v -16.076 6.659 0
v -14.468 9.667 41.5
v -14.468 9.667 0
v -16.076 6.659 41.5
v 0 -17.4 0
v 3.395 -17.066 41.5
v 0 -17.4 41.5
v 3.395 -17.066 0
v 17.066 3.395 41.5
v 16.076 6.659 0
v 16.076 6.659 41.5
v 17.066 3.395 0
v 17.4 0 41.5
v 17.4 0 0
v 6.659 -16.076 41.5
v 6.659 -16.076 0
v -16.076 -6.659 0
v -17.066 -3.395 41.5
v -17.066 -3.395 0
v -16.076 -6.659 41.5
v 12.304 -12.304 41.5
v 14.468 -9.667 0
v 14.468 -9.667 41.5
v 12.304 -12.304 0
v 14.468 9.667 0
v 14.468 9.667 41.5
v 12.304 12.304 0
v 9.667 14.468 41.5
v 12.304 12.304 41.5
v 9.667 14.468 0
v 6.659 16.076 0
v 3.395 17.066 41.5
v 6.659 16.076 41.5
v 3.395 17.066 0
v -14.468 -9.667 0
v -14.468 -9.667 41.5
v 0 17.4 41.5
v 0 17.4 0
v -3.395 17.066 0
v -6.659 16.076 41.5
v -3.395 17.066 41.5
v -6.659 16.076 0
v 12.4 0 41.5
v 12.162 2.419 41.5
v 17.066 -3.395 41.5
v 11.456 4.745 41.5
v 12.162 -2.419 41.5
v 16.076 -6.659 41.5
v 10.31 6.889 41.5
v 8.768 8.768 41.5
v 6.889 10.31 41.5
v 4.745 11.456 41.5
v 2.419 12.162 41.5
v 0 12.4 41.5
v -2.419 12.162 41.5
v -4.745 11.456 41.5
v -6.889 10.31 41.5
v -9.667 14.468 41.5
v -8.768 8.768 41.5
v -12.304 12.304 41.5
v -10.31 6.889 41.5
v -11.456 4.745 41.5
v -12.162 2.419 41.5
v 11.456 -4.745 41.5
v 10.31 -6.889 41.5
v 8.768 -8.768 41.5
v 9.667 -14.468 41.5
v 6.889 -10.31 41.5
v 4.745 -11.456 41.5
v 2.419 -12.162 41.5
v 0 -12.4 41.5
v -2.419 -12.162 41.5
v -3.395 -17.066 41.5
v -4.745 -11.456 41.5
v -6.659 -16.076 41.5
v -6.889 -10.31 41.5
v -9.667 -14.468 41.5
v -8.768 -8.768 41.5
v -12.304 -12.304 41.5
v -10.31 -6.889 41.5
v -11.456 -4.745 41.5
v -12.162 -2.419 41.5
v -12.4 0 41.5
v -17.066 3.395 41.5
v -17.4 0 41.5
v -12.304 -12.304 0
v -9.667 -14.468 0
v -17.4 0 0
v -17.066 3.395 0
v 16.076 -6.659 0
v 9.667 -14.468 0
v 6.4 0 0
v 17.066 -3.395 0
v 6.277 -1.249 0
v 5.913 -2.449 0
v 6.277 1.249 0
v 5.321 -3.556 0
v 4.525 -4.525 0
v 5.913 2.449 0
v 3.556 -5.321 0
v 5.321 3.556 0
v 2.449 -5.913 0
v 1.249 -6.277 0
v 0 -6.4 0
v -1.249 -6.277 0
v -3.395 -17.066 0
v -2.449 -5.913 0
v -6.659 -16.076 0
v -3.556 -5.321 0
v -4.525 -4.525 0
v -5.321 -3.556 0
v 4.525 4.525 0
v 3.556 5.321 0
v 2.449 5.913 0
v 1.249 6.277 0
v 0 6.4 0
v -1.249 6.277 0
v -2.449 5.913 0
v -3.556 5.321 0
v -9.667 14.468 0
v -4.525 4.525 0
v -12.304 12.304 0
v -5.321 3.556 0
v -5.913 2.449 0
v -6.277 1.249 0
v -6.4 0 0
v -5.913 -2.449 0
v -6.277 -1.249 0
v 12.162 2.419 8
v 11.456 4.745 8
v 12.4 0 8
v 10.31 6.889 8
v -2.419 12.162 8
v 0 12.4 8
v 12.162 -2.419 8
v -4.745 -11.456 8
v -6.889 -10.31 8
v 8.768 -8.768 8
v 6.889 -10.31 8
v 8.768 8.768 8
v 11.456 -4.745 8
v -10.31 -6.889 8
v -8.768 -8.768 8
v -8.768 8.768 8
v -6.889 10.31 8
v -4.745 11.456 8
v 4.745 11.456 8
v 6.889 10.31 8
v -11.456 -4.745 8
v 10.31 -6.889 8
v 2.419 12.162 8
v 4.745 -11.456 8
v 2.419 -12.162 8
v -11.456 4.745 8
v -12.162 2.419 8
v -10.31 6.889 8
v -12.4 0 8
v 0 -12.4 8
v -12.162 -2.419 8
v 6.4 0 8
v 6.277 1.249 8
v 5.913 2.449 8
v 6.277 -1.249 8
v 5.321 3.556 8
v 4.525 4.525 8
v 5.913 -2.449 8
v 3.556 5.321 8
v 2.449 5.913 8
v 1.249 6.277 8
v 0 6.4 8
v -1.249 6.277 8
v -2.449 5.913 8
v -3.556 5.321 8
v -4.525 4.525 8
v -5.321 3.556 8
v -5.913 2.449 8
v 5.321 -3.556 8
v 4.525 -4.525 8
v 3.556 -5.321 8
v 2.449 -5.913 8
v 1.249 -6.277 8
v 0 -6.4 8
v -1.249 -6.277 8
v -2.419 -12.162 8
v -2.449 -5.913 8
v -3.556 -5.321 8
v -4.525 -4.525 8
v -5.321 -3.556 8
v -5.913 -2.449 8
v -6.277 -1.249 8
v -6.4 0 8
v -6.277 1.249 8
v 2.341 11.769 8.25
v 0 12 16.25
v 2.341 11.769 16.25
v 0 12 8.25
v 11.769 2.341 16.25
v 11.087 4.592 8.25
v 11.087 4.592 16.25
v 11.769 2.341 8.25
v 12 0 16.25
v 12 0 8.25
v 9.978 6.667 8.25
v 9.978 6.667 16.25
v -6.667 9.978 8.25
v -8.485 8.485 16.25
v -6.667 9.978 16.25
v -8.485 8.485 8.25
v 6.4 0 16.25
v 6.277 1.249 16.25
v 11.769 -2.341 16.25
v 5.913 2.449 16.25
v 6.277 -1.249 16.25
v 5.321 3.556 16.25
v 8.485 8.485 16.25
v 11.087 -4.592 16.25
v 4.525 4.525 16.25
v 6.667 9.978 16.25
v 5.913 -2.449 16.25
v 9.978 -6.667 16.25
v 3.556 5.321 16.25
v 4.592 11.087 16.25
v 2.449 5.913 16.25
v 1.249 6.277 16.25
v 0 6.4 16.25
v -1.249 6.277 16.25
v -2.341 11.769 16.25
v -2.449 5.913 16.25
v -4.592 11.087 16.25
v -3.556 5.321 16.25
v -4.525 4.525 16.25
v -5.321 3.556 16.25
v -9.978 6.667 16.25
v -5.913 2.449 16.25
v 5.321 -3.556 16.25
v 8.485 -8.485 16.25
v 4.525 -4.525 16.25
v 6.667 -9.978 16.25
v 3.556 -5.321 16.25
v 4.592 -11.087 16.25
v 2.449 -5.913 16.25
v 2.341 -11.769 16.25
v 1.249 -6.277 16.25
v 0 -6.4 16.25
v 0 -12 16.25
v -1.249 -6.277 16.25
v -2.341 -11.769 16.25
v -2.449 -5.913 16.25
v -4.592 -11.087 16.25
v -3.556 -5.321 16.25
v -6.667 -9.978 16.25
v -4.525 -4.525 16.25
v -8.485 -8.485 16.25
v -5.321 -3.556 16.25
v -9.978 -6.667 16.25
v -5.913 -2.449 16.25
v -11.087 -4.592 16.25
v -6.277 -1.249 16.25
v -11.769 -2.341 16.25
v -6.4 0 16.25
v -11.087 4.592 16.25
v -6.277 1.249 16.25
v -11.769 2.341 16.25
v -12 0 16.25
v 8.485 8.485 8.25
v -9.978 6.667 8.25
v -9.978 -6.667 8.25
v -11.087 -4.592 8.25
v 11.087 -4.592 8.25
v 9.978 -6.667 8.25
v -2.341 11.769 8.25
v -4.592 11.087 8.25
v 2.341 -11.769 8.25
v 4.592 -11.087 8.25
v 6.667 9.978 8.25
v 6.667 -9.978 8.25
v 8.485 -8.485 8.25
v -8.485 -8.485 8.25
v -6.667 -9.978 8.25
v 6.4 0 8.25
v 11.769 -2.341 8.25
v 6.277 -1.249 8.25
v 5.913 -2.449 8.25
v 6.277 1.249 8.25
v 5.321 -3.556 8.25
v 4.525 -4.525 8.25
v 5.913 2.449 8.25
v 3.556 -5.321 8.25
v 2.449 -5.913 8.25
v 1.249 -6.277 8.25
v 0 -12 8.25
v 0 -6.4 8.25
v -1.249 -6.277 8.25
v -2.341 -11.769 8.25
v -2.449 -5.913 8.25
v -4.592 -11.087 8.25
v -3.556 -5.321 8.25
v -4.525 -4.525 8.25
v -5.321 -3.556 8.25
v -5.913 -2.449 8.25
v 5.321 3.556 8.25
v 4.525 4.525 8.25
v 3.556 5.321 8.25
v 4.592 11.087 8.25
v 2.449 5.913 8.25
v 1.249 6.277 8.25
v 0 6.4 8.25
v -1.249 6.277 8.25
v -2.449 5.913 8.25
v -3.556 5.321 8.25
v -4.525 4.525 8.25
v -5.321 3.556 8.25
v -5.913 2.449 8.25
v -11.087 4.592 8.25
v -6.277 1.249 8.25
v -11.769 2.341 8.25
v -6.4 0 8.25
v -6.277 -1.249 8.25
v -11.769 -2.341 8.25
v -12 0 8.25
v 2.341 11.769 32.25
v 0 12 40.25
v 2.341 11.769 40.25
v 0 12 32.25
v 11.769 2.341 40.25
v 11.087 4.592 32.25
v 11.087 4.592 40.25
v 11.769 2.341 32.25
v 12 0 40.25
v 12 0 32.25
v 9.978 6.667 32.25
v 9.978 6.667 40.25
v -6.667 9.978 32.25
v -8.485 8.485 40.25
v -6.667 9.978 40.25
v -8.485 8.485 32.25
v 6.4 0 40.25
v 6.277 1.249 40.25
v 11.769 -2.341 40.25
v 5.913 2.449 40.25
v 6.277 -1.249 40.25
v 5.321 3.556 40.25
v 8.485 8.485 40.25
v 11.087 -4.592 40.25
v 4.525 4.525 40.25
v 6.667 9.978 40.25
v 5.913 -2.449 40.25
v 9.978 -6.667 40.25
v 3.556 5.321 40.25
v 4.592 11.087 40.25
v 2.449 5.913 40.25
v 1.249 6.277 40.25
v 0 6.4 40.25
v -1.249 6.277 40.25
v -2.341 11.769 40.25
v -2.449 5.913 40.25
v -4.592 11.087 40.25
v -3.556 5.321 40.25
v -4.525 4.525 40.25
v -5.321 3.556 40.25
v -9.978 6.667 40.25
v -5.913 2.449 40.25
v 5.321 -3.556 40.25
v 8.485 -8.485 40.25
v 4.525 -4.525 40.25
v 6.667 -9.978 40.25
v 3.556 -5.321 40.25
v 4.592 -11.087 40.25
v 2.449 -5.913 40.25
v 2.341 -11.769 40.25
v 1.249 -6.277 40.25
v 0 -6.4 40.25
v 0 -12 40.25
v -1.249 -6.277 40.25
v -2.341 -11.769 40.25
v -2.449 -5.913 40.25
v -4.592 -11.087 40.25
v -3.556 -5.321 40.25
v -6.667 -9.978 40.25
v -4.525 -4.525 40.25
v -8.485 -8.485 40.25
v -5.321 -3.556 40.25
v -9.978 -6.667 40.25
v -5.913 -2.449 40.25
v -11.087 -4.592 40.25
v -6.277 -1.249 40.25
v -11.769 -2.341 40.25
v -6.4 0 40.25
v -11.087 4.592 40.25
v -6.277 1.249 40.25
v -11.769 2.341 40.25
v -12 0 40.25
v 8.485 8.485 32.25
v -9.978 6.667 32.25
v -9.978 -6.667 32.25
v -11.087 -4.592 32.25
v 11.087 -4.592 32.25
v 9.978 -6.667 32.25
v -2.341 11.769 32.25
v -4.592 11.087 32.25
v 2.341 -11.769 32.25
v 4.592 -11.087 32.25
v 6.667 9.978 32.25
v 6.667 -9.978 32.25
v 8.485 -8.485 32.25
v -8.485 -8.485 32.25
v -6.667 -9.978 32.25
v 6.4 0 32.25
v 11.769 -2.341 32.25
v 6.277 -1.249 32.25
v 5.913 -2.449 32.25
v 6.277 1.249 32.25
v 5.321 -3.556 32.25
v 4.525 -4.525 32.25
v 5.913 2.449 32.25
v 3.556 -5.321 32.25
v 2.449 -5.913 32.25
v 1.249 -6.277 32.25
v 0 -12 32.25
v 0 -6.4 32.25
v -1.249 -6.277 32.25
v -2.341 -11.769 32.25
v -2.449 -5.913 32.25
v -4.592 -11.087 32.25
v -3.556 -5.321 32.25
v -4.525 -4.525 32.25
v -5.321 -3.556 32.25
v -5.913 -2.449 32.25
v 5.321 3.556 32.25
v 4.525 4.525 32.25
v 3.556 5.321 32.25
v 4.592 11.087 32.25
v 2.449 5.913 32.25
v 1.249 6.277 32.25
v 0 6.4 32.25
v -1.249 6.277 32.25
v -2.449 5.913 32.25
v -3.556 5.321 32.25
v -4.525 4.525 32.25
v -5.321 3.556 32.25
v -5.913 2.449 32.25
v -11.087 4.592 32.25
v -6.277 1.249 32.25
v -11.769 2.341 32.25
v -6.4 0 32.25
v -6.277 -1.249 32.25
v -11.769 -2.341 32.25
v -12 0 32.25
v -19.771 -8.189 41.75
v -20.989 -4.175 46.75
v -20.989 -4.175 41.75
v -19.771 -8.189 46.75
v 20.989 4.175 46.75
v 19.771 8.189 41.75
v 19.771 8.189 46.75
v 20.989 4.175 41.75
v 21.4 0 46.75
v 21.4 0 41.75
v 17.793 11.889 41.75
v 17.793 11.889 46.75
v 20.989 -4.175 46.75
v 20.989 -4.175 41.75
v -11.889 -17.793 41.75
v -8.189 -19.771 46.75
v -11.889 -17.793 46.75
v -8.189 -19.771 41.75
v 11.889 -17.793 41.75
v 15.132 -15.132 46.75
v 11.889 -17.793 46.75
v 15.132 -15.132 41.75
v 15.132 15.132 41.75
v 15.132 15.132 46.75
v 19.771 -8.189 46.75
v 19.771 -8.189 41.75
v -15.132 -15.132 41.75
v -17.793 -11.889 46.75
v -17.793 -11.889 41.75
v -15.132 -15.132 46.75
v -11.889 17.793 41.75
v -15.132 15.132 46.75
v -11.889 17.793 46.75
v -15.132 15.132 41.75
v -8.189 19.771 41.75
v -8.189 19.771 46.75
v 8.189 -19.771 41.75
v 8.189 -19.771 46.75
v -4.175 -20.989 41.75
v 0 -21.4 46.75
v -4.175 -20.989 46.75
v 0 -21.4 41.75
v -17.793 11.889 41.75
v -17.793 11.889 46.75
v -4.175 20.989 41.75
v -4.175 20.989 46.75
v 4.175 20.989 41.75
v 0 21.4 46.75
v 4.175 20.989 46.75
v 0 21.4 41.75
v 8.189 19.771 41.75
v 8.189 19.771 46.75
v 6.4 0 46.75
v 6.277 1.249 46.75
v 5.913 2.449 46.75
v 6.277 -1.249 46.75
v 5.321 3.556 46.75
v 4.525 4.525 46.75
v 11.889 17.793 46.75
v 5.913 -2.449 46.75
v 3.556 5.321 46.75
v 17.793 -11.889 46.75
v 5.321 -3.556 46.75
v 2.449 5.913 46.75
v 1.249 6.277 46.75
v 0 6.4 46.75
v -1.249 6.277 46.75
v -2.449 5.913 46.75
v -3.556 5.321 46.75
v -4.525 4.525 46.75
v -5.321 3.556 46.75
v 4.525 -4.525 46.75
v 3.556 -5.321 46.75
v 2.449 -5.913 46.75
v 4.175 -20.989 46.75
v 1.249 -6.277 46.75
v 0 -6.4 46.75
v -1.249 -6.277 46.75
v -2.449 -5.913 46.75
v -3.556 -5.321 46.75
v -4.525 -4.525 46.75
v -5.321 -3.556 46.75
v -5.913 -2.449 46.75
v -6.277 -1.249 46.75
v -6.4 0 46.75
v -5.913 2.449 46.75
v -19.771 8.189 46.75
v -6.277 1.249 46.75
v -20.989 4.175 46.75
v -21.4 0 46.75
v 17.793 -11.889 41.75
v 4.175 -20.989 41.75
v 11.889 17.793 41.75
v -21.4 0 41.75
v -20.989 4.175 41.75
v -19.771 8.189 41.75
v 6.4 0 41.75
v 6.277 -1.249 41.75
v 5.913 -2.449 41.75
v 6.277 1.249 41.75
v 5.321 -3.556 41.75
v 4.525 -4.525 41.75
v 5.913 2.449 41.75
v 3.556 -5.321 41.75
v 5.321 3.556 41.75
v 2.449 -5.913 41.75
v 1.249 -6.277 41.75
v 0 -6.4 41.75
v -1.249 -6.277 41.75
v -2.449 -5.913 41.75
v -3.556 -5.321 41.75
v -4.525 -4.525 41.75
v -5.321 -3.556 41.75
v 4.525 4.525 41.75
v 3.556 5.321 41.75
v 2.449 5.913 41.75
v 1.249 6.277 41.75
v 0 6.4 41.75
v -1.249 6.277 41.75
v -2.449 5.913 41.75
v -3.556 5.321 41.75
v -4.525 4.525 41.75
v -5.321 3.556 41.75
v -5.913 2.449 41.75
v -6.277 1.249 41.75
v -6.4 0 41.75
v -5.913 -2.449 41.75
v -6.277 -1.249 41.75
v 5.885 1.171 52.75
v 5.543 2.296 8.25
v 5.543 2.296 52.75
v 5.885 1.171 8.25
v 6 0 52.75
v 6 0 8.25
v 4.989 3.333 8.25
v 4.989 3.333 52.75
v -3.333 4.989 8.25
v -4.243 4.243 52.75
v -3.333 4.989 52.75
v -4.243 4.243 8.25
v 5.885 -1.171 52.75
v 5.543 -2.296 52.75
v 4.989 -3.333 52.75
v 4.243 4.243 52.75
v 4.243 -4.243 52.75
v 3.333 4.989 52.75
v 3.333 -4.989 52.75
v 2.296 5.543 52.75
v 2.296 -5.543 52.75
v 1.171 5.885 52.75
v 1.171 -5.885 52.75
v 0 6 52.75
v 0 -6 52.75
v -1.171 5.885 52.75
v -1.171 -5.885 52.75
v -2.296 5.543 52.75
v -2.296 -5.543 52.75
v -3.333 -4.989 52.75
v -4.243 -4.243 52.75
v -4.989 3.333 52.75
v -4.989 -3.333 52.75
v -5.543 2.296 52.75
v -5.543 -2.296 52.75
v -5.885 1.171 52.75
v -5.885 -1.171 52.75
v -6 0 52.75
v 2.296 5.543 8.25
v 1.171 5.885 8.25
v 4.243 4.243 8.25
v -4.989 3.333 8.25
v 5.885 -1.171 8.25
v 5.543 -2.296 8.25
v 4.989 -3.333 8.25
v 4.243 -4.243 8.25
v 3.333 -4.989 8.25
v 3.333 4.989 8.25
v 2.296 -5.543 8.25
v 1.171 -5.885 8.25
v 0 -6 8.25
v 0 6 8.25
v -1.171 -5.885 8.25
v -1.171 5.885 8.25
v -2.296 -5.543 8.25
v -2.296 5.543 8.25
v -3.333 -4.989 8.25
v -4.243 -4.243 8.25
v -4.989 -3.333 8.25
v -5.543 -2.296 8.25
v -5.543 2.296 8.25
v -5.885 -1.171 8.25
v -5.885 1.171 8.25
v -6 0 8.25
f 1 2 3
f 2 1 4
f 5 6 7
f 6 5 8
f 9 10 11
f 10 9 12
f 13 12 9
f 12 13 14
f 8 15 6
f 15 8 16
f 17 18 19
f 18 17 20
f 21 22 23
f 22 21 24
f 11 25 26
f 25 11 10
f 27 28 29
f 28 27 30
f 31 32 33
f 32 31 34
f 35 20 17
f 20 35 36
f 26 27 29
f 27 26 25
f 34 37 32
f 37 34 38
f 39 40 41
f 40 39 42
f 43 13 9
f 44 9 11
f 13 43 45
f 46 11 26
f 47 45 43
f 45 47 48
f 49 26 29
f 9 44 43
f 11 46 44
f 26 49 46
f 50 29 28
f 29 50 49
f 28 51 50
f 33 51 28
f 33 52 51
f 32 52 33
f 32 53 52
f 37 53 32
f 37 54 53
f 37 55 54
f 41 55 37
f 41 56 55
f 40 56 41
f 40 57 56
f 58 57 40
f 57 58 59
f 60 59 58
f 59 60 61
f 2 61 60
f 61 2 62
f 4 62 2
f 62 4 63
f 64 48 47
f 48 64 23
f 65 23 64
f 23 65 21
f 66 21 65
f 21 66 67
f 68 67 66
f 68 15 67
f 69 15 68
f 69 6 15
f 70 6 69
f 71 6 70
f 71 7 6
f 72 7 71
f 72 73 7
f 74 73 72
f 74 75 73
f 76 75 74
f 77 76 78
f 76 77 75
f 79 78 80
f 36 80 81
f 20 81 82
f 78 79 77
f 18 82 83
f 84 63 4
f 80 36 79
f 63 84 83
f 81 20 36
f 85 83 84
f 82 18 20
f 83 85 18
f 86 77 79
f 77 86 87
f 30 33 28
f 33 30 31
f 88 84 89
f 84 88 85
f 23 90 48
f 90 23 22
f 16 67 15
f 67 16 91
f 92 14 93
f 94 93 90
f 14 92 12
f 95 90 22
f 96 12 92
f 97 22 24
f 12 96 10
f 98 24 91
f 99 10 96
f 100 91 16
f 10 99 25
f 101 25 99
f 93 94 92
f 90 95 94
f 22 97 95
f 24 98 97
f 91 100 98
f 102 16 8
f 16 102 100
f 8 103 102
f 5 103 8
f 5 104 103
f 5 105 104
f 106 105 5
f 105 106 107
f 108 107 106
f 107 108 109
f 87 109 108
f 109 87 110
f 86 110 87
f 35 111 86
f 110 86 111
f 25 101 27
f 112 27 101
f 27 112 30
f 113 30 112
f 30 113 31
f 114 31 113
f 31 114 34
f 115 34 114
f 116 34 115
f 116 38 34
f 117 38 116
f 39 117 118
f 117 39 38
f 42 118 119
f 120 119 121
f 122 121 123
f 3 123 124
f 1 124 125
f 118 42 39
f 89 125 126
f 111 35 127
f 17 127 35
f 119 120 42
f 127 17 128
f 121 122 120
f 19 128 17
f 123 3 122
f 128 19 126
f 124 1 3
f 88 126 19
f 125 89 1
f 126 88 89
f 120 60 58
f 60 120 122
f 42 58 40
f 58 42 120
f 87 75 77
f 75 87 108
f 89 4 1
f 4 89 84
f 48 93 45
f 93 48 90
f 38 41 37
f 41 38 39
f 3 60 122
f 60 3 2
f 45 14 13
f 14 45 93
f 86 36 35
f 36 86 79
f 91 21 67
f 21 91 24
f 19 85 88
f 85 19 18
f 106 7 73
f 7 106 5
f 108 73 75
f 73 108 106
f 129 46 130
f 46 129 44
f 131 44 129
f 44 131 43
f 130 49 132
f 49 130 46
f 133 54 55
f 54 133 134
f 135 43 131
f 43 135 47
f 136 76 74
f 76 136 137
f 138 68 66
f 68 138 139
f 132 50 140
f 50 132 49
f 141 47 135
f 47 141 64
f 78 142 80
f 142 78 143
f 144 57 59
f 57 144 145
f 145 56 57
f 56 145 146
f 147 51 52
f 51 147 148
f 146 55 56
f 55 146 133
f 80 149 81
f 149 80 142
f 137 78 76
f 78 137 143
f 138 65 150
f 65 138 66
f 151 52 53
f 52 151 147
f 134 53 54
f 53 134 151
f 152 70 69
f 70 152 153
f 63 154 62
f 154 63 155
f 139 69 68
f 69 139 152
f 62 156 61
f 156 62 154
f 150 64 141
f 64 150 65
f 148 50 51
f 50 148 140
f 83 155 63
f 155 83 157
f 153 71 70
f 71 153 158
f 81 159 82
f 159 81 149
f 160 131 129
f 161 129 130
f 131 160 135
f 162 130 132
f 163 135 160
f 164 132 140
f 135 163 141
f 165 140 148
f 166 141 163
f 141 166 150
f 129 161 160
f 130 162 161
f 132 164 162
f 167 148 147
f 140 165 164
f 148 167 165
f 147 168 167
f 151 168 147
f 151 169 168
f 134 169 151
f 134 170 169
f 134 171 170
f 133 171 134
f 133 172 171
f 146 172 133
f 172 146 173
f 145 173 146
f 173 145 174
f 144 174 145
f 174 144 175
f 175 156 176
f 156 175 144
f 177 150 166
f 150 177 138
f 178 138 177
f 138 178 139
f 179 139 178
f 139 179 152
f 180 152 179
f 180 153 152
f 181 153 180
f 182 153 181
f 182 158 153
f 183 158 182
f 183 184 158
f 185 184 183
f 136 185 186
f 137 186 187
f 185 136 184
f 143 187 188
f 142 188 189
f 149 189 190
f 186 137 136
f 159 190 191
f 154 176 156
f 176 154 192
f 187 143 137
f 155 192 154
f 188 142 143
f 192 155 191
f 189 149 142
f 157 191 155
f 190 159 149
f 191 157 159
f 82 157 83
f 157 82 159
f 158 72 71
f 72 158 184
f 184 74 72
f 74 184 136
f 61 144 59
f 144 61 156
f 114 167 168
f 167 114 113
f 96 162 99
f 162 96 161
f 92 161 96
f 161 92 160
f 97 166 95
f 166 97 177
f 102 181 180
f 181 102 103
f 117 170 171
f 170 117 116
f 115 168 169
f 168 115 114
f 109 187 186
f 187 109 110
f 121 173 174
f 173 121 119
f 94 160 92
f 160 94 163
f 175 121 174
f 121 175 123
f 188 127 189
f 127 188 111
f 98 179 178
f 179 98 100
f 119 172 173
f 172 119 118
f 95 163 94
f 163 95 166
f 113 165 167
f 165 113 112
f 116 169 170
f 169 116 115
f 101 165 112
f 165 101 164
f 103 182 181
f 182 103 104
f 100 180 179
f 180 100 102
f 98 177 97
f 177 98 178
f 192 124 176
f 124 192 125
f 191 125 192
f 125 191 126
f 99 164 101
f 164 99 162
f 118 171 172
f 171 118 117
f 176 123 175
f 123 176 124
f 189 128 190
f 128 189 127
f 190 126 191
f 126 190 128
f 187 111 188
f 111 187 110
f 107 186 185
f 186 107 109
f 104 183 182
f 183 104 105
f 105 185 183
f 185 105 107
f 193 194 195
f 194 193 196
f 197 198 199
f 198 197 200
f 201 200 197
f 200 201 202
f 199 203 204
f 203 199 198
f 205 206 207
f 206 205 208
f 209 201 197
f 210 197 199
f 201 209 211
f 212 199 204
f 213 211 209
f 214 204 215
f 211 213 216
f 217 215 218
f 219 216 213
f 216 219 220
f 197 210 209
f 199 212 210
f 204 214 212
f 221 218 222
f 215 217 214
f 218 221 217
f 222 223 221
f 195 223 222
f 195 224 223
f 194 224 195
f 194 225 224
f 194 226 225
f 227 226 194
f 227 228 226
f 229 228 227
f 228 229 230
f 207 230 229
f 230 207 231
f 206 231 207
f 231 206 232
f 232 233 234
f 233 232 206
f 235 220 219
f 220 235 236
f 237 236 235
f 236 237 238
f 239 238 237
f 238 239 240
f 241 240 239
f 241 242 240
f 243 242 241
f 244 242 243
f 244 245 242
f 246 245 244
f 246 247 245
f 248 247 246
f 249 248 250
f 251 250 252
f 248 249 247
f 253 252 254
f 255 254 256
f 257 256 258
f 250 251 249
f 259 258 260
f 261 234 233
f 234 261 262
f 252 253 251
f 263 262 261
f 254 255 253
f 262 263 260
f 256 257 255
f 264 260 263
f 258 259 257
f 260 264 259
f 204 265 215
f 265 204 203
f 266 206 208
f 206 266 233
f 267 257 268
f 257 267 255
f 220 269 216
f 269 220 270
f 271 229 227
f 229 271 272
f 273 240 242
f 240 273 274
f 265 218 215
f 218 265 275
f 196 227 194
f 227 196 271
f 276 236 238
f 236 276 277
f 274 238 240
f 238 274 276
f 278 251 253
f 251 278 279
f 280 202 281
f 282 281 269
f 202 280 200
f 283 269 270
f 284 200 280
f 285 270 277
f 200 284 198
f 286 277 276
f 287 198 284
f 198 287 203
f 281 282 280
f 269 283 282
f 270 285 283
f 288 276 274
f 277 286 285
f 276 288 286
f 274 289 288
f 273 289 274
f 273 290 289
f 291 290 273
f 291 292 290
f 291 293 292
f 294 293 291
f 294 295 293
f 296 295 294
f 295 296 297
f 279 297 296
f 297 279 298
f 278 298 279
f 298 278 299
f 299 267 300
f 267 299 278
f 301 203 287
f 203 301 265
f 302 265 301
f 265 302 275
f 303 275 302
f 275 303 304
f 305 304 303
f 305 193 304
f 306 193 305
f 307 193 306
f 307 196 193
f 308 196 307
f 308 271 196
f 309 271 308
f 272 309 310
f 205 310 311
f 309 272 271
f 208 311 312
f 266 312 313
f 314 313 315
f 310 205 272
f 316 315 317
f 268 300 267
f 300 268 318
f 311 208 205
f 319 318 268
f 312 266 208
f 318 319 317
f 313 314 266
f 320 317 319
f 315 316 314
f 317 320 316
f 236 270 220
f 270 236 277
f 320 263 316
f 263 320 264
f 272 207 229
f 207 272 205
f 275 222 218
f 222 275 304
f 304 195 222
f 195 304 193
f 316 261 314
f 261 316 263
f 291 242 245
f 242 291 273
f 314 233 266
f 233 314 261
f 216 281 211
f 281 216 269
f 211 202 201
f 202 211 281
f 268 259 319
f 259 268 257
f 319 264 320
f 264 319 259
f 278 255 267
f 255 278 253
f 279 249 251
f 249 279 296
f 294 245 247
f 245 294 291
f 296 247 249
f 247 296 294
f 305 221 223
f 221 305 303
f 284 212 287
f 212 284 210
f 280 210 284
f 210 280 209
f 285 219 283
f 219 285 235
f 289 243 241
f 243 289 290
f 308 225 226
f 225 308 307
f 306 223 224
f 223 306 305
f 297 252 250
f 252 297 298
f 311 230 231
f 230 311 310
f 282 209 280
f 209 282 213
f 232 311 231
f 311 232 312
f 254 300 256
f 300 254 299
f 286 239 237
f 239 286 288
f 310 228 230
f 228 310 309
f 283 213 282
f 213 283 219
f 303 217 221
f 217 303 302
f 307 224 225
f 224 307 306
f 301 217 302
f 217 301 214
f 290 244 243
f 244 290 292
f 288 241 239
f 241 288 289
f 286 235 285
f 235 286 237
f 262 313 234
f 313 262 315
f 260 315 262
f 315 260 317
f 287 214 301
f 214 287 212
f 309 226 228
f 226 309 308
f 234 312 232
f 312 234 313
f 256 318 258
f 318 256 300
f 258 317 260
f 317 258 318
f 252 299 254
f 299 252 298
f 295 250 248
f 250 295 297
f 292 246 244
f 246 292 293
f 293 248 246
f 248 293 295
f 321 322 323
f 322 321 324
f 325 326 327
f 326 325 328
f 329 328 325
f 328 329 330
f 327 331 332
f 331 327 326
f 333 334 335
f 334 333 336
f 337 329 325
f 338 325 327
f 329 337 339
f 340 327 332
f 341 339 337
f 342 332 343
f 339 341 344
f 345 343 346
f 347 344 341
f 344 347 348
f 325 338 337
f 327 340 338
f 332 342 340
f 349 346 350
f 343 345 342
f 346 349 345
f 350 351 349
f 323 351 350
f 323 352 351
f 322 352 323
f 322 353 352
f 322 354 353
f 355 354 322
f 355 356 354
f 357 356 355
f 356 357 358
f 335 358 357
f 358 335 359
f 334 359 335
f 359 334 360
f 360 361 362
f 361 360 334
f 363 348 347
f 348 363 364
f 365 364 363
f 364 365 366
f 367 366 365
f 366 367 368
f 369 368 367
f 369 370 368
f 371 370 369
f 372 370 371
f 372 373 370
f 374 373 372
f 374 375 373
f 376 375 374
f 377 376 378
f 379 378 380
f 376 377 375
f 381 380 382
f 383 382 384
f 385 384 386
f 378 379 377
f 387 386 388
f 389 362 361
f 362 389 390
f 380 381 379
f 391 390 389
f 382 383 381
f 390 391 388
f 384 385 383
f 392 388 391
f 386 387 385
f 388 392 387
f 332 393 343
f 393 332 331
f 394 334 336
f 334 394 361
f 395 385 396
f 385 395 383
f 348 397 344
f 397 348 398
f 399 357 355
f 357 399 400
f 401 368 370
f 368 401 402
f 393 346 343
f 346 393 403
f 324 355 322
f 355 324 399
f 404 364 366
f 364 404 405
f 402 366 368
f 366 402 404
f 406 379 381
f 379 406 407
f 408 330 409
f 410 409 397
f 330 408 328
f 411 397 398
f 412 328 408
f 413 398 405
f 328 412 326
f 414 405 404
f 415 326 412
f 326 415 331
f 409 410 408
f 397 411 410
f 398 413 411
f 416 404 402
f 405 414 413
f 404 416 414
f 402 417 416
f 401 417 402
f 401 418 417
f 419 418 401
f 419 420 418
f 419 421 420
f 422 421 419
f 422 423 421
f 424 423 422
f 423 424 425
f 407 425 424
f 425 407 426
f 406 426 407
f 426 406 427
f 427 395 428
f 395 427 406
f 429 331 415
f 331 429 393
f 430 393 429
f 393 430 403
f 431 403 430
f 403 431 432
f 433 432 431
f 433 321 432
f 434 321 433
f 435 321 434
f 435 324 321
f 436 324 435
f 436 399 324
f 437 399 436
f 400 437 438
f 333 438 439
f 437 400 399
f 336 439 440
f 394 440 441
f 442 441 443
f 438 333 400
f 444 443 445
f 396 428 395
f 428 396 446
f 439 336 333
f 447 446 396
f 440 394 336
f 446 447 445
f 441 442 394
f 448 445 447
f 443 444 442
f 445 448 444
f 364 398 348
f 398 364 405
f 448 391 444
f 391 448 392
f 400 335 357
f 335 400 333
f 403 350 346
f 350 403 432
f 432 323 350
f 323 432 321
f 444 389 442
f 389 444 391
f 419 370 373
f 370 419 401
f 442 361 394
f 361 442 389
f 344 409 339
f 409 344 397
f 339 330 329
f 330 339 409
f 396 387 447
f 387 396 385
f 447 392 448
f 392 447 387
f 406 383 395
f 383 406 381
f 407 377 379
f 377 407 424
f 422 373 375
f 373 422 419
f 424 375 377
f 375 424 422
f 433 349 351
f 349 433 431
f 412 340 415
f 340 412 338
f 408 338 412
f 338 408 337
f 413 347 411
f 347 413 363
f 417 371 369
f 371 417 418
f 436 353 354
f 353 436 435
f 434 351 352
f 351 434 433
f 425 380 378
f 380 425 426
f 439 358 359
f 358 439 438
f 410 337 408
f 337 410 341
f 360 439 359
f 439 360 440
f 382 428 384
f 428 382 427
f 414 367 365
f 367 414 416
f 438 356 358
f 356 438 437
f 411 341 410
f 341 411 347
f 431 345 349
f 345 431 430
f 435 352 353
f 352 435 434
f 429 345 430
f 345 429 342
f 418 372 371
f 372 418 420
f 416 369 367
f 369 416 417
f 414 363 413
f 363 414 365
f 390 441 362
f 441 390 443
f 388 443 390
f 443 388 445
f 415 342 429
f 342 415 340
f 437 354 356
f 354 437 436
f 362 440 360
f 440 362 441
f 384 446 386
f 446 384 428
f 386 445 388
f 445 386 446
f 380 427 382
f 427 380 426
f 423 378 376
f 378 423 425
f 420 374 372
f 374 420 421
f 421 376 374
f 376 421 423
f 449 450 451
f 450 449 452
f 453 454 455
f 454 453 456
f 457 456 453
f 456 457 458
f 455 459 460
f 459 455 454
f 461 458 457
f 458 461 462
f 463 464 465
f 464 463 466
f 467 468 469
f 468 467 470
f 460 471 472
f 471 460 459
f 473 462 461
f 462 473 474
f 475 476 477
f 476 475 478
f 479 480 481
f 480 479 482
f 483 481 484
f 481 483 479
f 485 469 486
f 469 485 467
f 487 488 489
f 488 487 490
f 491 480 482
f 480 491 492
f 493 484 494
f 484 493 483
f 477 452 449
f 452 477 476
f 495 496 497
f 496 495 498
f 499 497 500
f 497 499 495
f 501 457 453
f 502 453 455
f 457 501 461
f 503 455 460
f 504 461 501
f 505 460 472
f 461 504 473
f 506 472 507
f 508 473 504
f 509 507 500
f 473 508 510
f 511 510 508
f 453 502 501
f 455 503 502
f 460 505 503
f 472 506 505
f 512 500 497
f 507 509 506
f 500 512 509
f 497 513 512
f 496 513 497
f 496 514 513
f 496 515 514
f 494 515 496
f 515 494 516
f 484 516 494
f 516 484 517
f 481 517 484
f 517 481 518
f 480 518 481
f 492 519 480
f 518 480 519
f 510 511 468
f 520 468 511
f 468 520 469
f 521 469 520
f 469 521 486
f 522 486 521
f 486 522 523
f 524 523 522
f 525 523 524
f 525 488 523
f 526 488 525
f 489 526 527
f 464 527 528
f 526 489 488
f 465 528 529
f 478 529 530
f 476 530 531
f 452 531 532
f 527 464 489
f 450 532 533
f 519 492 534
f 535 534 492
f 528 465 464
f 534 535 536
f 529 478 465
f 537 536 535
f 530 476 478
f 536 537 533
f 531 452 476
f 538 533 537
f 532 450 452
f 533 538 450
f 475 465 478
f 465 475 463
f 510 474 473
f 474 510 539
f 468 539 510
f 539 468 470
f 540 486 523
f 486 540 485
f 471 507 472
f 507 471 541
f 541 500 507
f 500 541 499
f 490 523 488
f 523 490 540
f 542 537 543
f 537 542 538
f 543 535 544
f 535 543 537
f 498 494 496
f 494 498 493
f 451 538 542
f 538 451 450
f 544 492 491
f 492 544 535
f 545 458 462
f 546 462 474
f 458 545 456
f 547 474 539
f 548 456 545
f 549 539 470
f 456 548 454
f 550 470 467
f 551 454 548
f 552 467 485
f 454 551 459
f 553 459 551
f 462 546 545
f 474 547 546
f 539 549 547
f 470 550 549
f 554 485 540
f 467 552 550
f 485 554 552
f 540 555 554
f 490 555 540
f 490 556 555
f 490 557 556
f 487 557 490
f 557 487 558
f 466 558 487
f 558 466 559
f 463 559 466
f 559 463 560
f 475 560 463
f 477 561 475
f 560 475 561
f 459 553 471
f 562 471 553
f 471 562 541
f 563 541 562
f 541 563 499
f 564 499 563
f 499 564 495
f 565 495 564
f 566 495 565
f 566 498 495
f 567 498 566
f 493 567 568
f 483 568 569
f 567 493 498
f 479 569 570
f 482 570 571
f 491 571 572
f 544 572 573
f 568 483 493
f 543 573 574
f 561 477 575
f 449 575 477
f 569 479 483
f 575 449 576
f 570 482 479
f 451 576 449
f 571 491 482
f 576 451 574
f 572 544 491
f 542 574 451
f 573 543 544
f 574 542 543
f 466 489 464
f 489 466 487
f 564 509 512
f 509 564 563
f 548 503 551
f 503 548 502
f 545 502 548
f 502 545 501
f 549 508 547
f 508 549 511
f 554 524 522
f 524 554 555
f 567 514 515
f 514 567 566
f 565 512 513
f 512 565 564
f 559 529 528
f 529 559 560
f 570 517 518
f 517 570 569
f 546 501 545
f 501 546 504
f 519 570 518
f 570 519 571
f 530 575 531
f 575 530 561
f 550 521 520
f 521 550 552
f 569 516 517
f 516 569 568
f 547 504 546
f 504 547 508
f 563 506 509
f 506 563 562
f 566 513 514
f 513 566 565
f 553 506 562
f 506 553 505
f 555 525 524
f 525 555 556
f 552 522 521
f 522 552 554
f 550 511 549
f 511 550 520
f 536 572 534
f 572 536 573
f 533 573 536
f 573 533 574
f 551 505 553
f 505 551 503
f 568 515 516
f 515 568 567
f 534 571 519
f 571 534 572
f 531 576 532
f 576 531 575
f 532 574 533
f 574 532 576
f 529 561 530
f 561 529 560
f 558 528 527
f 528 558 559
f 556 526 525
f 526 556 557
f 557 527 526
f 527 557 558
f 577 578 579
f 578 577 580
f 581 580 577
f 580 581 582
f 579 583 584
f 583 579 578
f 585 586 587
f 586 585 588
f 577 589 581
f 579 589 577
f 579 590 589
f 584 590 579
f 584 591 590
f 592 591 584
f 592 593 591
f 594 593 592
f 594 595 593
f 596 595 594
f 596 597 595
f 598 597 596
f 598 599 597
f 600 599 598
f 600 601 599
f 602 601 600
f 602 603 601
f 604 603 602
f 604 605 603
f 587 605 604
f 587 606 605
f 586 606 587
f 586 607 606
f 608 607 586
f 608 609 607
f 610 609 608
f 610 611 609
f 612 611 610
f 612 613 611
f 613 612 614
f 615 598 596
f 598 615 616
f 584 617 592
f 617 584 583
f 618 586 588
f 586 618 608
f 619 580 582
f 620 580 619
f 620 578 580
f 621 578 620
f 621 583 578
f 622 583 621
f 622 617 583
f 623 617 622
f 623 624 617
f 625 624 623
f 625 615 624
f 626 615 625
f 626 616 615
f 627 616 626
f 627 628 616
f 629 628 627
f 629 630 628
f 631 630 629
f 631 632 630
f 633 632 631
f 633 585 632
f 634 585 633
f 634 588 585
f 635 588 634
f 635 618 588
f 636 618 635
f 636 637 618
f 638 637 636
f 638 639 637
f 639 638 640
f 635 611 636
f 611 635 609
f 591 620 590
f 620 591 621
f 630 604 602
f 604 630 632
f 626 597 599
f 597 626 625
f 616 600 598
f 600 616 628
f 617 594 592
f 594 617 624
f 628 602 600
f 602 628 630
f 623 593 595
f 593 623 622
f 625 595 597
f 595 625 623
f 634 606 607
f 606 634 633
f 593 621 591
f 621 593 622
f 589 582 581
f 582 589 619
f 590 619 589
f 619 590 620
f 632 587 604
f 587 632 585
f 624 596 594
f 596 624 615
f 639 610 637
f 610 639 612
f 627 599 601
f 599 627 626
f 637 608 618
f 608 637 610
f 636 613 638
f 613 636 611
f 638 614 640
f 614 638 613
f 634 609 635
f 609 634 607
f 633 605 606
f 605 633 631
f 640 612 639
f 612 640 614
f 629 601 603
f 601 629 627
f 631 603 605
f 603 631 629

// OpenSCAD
$fn = 32;

// ------------------------------------------------------------------------
// Shaft station: cup d34.8 x 41.5 mm, shaft d12
// Every part is its own module, assembly() places every instance.
// ------------------------------------------------------------------------

// --- part 1 ---
module housing_cup() {
  difference() {
    cylinder(h = 41.5, d = 34.8);
    translate([0, 0, 8]) cylinder(h = 34.5, d = 24.8);
    translate([0, 0, -1]) cylinder(h = 10, d = 12.8);
  }
}

// --- part 2 ---
module bearing_lower() {
  difference() {
      translate([0, 0, 0]) cylinder(h = 8, d = 24);
      translate([0, 0, -1]) cylinder(h = 10, d = 12.8);
    }
}

// --- part 3 ---
module bearing_upper() {
  difference() {
      translate([0, 0, 0]) cylinder(h = 8, d = 24);
      translate([0, 0, -1]) cylinder(h = 10, d = 12.8);
    }
}

// --- part 4 ---
module station_shaft() {
  translate([0, 0, -22.25]) cylinder(h = 44.5, d = 12);
}

// --- part 5 ---
module station_cover() {
  difference() {
    cylinder(h = 5, d = 42.8);
    translate([0, 0, -1]) cylinder(h = 7, d = 12.8);
  }
}

// --- assembly ---
module assembly() {
  color([0.80, 0.24, 0.20]) translate([0, 0, 0]) rotate([0, 0, 0]) housing_cup();
  color([0.20, 0.45, 0.75]) translate([0, 0, 8.25]) rotate([0, 0, 0]) bearing_lower();
  color([0.25, 0.62, 0.32]) translate([0, 0, 32.25]) rotate([0, 0, 0]) bearing_upper();
  color([0.92, 0.70, 0.18]) translate([0, 0, 30.5]) rotate([0, 0, 0]) station_shaft();
  color([0.58, 0.35, 0.70]) translate([0, 0, 41.75]) rotate([0, 0, 0]) station_cover();
}

assembly();
